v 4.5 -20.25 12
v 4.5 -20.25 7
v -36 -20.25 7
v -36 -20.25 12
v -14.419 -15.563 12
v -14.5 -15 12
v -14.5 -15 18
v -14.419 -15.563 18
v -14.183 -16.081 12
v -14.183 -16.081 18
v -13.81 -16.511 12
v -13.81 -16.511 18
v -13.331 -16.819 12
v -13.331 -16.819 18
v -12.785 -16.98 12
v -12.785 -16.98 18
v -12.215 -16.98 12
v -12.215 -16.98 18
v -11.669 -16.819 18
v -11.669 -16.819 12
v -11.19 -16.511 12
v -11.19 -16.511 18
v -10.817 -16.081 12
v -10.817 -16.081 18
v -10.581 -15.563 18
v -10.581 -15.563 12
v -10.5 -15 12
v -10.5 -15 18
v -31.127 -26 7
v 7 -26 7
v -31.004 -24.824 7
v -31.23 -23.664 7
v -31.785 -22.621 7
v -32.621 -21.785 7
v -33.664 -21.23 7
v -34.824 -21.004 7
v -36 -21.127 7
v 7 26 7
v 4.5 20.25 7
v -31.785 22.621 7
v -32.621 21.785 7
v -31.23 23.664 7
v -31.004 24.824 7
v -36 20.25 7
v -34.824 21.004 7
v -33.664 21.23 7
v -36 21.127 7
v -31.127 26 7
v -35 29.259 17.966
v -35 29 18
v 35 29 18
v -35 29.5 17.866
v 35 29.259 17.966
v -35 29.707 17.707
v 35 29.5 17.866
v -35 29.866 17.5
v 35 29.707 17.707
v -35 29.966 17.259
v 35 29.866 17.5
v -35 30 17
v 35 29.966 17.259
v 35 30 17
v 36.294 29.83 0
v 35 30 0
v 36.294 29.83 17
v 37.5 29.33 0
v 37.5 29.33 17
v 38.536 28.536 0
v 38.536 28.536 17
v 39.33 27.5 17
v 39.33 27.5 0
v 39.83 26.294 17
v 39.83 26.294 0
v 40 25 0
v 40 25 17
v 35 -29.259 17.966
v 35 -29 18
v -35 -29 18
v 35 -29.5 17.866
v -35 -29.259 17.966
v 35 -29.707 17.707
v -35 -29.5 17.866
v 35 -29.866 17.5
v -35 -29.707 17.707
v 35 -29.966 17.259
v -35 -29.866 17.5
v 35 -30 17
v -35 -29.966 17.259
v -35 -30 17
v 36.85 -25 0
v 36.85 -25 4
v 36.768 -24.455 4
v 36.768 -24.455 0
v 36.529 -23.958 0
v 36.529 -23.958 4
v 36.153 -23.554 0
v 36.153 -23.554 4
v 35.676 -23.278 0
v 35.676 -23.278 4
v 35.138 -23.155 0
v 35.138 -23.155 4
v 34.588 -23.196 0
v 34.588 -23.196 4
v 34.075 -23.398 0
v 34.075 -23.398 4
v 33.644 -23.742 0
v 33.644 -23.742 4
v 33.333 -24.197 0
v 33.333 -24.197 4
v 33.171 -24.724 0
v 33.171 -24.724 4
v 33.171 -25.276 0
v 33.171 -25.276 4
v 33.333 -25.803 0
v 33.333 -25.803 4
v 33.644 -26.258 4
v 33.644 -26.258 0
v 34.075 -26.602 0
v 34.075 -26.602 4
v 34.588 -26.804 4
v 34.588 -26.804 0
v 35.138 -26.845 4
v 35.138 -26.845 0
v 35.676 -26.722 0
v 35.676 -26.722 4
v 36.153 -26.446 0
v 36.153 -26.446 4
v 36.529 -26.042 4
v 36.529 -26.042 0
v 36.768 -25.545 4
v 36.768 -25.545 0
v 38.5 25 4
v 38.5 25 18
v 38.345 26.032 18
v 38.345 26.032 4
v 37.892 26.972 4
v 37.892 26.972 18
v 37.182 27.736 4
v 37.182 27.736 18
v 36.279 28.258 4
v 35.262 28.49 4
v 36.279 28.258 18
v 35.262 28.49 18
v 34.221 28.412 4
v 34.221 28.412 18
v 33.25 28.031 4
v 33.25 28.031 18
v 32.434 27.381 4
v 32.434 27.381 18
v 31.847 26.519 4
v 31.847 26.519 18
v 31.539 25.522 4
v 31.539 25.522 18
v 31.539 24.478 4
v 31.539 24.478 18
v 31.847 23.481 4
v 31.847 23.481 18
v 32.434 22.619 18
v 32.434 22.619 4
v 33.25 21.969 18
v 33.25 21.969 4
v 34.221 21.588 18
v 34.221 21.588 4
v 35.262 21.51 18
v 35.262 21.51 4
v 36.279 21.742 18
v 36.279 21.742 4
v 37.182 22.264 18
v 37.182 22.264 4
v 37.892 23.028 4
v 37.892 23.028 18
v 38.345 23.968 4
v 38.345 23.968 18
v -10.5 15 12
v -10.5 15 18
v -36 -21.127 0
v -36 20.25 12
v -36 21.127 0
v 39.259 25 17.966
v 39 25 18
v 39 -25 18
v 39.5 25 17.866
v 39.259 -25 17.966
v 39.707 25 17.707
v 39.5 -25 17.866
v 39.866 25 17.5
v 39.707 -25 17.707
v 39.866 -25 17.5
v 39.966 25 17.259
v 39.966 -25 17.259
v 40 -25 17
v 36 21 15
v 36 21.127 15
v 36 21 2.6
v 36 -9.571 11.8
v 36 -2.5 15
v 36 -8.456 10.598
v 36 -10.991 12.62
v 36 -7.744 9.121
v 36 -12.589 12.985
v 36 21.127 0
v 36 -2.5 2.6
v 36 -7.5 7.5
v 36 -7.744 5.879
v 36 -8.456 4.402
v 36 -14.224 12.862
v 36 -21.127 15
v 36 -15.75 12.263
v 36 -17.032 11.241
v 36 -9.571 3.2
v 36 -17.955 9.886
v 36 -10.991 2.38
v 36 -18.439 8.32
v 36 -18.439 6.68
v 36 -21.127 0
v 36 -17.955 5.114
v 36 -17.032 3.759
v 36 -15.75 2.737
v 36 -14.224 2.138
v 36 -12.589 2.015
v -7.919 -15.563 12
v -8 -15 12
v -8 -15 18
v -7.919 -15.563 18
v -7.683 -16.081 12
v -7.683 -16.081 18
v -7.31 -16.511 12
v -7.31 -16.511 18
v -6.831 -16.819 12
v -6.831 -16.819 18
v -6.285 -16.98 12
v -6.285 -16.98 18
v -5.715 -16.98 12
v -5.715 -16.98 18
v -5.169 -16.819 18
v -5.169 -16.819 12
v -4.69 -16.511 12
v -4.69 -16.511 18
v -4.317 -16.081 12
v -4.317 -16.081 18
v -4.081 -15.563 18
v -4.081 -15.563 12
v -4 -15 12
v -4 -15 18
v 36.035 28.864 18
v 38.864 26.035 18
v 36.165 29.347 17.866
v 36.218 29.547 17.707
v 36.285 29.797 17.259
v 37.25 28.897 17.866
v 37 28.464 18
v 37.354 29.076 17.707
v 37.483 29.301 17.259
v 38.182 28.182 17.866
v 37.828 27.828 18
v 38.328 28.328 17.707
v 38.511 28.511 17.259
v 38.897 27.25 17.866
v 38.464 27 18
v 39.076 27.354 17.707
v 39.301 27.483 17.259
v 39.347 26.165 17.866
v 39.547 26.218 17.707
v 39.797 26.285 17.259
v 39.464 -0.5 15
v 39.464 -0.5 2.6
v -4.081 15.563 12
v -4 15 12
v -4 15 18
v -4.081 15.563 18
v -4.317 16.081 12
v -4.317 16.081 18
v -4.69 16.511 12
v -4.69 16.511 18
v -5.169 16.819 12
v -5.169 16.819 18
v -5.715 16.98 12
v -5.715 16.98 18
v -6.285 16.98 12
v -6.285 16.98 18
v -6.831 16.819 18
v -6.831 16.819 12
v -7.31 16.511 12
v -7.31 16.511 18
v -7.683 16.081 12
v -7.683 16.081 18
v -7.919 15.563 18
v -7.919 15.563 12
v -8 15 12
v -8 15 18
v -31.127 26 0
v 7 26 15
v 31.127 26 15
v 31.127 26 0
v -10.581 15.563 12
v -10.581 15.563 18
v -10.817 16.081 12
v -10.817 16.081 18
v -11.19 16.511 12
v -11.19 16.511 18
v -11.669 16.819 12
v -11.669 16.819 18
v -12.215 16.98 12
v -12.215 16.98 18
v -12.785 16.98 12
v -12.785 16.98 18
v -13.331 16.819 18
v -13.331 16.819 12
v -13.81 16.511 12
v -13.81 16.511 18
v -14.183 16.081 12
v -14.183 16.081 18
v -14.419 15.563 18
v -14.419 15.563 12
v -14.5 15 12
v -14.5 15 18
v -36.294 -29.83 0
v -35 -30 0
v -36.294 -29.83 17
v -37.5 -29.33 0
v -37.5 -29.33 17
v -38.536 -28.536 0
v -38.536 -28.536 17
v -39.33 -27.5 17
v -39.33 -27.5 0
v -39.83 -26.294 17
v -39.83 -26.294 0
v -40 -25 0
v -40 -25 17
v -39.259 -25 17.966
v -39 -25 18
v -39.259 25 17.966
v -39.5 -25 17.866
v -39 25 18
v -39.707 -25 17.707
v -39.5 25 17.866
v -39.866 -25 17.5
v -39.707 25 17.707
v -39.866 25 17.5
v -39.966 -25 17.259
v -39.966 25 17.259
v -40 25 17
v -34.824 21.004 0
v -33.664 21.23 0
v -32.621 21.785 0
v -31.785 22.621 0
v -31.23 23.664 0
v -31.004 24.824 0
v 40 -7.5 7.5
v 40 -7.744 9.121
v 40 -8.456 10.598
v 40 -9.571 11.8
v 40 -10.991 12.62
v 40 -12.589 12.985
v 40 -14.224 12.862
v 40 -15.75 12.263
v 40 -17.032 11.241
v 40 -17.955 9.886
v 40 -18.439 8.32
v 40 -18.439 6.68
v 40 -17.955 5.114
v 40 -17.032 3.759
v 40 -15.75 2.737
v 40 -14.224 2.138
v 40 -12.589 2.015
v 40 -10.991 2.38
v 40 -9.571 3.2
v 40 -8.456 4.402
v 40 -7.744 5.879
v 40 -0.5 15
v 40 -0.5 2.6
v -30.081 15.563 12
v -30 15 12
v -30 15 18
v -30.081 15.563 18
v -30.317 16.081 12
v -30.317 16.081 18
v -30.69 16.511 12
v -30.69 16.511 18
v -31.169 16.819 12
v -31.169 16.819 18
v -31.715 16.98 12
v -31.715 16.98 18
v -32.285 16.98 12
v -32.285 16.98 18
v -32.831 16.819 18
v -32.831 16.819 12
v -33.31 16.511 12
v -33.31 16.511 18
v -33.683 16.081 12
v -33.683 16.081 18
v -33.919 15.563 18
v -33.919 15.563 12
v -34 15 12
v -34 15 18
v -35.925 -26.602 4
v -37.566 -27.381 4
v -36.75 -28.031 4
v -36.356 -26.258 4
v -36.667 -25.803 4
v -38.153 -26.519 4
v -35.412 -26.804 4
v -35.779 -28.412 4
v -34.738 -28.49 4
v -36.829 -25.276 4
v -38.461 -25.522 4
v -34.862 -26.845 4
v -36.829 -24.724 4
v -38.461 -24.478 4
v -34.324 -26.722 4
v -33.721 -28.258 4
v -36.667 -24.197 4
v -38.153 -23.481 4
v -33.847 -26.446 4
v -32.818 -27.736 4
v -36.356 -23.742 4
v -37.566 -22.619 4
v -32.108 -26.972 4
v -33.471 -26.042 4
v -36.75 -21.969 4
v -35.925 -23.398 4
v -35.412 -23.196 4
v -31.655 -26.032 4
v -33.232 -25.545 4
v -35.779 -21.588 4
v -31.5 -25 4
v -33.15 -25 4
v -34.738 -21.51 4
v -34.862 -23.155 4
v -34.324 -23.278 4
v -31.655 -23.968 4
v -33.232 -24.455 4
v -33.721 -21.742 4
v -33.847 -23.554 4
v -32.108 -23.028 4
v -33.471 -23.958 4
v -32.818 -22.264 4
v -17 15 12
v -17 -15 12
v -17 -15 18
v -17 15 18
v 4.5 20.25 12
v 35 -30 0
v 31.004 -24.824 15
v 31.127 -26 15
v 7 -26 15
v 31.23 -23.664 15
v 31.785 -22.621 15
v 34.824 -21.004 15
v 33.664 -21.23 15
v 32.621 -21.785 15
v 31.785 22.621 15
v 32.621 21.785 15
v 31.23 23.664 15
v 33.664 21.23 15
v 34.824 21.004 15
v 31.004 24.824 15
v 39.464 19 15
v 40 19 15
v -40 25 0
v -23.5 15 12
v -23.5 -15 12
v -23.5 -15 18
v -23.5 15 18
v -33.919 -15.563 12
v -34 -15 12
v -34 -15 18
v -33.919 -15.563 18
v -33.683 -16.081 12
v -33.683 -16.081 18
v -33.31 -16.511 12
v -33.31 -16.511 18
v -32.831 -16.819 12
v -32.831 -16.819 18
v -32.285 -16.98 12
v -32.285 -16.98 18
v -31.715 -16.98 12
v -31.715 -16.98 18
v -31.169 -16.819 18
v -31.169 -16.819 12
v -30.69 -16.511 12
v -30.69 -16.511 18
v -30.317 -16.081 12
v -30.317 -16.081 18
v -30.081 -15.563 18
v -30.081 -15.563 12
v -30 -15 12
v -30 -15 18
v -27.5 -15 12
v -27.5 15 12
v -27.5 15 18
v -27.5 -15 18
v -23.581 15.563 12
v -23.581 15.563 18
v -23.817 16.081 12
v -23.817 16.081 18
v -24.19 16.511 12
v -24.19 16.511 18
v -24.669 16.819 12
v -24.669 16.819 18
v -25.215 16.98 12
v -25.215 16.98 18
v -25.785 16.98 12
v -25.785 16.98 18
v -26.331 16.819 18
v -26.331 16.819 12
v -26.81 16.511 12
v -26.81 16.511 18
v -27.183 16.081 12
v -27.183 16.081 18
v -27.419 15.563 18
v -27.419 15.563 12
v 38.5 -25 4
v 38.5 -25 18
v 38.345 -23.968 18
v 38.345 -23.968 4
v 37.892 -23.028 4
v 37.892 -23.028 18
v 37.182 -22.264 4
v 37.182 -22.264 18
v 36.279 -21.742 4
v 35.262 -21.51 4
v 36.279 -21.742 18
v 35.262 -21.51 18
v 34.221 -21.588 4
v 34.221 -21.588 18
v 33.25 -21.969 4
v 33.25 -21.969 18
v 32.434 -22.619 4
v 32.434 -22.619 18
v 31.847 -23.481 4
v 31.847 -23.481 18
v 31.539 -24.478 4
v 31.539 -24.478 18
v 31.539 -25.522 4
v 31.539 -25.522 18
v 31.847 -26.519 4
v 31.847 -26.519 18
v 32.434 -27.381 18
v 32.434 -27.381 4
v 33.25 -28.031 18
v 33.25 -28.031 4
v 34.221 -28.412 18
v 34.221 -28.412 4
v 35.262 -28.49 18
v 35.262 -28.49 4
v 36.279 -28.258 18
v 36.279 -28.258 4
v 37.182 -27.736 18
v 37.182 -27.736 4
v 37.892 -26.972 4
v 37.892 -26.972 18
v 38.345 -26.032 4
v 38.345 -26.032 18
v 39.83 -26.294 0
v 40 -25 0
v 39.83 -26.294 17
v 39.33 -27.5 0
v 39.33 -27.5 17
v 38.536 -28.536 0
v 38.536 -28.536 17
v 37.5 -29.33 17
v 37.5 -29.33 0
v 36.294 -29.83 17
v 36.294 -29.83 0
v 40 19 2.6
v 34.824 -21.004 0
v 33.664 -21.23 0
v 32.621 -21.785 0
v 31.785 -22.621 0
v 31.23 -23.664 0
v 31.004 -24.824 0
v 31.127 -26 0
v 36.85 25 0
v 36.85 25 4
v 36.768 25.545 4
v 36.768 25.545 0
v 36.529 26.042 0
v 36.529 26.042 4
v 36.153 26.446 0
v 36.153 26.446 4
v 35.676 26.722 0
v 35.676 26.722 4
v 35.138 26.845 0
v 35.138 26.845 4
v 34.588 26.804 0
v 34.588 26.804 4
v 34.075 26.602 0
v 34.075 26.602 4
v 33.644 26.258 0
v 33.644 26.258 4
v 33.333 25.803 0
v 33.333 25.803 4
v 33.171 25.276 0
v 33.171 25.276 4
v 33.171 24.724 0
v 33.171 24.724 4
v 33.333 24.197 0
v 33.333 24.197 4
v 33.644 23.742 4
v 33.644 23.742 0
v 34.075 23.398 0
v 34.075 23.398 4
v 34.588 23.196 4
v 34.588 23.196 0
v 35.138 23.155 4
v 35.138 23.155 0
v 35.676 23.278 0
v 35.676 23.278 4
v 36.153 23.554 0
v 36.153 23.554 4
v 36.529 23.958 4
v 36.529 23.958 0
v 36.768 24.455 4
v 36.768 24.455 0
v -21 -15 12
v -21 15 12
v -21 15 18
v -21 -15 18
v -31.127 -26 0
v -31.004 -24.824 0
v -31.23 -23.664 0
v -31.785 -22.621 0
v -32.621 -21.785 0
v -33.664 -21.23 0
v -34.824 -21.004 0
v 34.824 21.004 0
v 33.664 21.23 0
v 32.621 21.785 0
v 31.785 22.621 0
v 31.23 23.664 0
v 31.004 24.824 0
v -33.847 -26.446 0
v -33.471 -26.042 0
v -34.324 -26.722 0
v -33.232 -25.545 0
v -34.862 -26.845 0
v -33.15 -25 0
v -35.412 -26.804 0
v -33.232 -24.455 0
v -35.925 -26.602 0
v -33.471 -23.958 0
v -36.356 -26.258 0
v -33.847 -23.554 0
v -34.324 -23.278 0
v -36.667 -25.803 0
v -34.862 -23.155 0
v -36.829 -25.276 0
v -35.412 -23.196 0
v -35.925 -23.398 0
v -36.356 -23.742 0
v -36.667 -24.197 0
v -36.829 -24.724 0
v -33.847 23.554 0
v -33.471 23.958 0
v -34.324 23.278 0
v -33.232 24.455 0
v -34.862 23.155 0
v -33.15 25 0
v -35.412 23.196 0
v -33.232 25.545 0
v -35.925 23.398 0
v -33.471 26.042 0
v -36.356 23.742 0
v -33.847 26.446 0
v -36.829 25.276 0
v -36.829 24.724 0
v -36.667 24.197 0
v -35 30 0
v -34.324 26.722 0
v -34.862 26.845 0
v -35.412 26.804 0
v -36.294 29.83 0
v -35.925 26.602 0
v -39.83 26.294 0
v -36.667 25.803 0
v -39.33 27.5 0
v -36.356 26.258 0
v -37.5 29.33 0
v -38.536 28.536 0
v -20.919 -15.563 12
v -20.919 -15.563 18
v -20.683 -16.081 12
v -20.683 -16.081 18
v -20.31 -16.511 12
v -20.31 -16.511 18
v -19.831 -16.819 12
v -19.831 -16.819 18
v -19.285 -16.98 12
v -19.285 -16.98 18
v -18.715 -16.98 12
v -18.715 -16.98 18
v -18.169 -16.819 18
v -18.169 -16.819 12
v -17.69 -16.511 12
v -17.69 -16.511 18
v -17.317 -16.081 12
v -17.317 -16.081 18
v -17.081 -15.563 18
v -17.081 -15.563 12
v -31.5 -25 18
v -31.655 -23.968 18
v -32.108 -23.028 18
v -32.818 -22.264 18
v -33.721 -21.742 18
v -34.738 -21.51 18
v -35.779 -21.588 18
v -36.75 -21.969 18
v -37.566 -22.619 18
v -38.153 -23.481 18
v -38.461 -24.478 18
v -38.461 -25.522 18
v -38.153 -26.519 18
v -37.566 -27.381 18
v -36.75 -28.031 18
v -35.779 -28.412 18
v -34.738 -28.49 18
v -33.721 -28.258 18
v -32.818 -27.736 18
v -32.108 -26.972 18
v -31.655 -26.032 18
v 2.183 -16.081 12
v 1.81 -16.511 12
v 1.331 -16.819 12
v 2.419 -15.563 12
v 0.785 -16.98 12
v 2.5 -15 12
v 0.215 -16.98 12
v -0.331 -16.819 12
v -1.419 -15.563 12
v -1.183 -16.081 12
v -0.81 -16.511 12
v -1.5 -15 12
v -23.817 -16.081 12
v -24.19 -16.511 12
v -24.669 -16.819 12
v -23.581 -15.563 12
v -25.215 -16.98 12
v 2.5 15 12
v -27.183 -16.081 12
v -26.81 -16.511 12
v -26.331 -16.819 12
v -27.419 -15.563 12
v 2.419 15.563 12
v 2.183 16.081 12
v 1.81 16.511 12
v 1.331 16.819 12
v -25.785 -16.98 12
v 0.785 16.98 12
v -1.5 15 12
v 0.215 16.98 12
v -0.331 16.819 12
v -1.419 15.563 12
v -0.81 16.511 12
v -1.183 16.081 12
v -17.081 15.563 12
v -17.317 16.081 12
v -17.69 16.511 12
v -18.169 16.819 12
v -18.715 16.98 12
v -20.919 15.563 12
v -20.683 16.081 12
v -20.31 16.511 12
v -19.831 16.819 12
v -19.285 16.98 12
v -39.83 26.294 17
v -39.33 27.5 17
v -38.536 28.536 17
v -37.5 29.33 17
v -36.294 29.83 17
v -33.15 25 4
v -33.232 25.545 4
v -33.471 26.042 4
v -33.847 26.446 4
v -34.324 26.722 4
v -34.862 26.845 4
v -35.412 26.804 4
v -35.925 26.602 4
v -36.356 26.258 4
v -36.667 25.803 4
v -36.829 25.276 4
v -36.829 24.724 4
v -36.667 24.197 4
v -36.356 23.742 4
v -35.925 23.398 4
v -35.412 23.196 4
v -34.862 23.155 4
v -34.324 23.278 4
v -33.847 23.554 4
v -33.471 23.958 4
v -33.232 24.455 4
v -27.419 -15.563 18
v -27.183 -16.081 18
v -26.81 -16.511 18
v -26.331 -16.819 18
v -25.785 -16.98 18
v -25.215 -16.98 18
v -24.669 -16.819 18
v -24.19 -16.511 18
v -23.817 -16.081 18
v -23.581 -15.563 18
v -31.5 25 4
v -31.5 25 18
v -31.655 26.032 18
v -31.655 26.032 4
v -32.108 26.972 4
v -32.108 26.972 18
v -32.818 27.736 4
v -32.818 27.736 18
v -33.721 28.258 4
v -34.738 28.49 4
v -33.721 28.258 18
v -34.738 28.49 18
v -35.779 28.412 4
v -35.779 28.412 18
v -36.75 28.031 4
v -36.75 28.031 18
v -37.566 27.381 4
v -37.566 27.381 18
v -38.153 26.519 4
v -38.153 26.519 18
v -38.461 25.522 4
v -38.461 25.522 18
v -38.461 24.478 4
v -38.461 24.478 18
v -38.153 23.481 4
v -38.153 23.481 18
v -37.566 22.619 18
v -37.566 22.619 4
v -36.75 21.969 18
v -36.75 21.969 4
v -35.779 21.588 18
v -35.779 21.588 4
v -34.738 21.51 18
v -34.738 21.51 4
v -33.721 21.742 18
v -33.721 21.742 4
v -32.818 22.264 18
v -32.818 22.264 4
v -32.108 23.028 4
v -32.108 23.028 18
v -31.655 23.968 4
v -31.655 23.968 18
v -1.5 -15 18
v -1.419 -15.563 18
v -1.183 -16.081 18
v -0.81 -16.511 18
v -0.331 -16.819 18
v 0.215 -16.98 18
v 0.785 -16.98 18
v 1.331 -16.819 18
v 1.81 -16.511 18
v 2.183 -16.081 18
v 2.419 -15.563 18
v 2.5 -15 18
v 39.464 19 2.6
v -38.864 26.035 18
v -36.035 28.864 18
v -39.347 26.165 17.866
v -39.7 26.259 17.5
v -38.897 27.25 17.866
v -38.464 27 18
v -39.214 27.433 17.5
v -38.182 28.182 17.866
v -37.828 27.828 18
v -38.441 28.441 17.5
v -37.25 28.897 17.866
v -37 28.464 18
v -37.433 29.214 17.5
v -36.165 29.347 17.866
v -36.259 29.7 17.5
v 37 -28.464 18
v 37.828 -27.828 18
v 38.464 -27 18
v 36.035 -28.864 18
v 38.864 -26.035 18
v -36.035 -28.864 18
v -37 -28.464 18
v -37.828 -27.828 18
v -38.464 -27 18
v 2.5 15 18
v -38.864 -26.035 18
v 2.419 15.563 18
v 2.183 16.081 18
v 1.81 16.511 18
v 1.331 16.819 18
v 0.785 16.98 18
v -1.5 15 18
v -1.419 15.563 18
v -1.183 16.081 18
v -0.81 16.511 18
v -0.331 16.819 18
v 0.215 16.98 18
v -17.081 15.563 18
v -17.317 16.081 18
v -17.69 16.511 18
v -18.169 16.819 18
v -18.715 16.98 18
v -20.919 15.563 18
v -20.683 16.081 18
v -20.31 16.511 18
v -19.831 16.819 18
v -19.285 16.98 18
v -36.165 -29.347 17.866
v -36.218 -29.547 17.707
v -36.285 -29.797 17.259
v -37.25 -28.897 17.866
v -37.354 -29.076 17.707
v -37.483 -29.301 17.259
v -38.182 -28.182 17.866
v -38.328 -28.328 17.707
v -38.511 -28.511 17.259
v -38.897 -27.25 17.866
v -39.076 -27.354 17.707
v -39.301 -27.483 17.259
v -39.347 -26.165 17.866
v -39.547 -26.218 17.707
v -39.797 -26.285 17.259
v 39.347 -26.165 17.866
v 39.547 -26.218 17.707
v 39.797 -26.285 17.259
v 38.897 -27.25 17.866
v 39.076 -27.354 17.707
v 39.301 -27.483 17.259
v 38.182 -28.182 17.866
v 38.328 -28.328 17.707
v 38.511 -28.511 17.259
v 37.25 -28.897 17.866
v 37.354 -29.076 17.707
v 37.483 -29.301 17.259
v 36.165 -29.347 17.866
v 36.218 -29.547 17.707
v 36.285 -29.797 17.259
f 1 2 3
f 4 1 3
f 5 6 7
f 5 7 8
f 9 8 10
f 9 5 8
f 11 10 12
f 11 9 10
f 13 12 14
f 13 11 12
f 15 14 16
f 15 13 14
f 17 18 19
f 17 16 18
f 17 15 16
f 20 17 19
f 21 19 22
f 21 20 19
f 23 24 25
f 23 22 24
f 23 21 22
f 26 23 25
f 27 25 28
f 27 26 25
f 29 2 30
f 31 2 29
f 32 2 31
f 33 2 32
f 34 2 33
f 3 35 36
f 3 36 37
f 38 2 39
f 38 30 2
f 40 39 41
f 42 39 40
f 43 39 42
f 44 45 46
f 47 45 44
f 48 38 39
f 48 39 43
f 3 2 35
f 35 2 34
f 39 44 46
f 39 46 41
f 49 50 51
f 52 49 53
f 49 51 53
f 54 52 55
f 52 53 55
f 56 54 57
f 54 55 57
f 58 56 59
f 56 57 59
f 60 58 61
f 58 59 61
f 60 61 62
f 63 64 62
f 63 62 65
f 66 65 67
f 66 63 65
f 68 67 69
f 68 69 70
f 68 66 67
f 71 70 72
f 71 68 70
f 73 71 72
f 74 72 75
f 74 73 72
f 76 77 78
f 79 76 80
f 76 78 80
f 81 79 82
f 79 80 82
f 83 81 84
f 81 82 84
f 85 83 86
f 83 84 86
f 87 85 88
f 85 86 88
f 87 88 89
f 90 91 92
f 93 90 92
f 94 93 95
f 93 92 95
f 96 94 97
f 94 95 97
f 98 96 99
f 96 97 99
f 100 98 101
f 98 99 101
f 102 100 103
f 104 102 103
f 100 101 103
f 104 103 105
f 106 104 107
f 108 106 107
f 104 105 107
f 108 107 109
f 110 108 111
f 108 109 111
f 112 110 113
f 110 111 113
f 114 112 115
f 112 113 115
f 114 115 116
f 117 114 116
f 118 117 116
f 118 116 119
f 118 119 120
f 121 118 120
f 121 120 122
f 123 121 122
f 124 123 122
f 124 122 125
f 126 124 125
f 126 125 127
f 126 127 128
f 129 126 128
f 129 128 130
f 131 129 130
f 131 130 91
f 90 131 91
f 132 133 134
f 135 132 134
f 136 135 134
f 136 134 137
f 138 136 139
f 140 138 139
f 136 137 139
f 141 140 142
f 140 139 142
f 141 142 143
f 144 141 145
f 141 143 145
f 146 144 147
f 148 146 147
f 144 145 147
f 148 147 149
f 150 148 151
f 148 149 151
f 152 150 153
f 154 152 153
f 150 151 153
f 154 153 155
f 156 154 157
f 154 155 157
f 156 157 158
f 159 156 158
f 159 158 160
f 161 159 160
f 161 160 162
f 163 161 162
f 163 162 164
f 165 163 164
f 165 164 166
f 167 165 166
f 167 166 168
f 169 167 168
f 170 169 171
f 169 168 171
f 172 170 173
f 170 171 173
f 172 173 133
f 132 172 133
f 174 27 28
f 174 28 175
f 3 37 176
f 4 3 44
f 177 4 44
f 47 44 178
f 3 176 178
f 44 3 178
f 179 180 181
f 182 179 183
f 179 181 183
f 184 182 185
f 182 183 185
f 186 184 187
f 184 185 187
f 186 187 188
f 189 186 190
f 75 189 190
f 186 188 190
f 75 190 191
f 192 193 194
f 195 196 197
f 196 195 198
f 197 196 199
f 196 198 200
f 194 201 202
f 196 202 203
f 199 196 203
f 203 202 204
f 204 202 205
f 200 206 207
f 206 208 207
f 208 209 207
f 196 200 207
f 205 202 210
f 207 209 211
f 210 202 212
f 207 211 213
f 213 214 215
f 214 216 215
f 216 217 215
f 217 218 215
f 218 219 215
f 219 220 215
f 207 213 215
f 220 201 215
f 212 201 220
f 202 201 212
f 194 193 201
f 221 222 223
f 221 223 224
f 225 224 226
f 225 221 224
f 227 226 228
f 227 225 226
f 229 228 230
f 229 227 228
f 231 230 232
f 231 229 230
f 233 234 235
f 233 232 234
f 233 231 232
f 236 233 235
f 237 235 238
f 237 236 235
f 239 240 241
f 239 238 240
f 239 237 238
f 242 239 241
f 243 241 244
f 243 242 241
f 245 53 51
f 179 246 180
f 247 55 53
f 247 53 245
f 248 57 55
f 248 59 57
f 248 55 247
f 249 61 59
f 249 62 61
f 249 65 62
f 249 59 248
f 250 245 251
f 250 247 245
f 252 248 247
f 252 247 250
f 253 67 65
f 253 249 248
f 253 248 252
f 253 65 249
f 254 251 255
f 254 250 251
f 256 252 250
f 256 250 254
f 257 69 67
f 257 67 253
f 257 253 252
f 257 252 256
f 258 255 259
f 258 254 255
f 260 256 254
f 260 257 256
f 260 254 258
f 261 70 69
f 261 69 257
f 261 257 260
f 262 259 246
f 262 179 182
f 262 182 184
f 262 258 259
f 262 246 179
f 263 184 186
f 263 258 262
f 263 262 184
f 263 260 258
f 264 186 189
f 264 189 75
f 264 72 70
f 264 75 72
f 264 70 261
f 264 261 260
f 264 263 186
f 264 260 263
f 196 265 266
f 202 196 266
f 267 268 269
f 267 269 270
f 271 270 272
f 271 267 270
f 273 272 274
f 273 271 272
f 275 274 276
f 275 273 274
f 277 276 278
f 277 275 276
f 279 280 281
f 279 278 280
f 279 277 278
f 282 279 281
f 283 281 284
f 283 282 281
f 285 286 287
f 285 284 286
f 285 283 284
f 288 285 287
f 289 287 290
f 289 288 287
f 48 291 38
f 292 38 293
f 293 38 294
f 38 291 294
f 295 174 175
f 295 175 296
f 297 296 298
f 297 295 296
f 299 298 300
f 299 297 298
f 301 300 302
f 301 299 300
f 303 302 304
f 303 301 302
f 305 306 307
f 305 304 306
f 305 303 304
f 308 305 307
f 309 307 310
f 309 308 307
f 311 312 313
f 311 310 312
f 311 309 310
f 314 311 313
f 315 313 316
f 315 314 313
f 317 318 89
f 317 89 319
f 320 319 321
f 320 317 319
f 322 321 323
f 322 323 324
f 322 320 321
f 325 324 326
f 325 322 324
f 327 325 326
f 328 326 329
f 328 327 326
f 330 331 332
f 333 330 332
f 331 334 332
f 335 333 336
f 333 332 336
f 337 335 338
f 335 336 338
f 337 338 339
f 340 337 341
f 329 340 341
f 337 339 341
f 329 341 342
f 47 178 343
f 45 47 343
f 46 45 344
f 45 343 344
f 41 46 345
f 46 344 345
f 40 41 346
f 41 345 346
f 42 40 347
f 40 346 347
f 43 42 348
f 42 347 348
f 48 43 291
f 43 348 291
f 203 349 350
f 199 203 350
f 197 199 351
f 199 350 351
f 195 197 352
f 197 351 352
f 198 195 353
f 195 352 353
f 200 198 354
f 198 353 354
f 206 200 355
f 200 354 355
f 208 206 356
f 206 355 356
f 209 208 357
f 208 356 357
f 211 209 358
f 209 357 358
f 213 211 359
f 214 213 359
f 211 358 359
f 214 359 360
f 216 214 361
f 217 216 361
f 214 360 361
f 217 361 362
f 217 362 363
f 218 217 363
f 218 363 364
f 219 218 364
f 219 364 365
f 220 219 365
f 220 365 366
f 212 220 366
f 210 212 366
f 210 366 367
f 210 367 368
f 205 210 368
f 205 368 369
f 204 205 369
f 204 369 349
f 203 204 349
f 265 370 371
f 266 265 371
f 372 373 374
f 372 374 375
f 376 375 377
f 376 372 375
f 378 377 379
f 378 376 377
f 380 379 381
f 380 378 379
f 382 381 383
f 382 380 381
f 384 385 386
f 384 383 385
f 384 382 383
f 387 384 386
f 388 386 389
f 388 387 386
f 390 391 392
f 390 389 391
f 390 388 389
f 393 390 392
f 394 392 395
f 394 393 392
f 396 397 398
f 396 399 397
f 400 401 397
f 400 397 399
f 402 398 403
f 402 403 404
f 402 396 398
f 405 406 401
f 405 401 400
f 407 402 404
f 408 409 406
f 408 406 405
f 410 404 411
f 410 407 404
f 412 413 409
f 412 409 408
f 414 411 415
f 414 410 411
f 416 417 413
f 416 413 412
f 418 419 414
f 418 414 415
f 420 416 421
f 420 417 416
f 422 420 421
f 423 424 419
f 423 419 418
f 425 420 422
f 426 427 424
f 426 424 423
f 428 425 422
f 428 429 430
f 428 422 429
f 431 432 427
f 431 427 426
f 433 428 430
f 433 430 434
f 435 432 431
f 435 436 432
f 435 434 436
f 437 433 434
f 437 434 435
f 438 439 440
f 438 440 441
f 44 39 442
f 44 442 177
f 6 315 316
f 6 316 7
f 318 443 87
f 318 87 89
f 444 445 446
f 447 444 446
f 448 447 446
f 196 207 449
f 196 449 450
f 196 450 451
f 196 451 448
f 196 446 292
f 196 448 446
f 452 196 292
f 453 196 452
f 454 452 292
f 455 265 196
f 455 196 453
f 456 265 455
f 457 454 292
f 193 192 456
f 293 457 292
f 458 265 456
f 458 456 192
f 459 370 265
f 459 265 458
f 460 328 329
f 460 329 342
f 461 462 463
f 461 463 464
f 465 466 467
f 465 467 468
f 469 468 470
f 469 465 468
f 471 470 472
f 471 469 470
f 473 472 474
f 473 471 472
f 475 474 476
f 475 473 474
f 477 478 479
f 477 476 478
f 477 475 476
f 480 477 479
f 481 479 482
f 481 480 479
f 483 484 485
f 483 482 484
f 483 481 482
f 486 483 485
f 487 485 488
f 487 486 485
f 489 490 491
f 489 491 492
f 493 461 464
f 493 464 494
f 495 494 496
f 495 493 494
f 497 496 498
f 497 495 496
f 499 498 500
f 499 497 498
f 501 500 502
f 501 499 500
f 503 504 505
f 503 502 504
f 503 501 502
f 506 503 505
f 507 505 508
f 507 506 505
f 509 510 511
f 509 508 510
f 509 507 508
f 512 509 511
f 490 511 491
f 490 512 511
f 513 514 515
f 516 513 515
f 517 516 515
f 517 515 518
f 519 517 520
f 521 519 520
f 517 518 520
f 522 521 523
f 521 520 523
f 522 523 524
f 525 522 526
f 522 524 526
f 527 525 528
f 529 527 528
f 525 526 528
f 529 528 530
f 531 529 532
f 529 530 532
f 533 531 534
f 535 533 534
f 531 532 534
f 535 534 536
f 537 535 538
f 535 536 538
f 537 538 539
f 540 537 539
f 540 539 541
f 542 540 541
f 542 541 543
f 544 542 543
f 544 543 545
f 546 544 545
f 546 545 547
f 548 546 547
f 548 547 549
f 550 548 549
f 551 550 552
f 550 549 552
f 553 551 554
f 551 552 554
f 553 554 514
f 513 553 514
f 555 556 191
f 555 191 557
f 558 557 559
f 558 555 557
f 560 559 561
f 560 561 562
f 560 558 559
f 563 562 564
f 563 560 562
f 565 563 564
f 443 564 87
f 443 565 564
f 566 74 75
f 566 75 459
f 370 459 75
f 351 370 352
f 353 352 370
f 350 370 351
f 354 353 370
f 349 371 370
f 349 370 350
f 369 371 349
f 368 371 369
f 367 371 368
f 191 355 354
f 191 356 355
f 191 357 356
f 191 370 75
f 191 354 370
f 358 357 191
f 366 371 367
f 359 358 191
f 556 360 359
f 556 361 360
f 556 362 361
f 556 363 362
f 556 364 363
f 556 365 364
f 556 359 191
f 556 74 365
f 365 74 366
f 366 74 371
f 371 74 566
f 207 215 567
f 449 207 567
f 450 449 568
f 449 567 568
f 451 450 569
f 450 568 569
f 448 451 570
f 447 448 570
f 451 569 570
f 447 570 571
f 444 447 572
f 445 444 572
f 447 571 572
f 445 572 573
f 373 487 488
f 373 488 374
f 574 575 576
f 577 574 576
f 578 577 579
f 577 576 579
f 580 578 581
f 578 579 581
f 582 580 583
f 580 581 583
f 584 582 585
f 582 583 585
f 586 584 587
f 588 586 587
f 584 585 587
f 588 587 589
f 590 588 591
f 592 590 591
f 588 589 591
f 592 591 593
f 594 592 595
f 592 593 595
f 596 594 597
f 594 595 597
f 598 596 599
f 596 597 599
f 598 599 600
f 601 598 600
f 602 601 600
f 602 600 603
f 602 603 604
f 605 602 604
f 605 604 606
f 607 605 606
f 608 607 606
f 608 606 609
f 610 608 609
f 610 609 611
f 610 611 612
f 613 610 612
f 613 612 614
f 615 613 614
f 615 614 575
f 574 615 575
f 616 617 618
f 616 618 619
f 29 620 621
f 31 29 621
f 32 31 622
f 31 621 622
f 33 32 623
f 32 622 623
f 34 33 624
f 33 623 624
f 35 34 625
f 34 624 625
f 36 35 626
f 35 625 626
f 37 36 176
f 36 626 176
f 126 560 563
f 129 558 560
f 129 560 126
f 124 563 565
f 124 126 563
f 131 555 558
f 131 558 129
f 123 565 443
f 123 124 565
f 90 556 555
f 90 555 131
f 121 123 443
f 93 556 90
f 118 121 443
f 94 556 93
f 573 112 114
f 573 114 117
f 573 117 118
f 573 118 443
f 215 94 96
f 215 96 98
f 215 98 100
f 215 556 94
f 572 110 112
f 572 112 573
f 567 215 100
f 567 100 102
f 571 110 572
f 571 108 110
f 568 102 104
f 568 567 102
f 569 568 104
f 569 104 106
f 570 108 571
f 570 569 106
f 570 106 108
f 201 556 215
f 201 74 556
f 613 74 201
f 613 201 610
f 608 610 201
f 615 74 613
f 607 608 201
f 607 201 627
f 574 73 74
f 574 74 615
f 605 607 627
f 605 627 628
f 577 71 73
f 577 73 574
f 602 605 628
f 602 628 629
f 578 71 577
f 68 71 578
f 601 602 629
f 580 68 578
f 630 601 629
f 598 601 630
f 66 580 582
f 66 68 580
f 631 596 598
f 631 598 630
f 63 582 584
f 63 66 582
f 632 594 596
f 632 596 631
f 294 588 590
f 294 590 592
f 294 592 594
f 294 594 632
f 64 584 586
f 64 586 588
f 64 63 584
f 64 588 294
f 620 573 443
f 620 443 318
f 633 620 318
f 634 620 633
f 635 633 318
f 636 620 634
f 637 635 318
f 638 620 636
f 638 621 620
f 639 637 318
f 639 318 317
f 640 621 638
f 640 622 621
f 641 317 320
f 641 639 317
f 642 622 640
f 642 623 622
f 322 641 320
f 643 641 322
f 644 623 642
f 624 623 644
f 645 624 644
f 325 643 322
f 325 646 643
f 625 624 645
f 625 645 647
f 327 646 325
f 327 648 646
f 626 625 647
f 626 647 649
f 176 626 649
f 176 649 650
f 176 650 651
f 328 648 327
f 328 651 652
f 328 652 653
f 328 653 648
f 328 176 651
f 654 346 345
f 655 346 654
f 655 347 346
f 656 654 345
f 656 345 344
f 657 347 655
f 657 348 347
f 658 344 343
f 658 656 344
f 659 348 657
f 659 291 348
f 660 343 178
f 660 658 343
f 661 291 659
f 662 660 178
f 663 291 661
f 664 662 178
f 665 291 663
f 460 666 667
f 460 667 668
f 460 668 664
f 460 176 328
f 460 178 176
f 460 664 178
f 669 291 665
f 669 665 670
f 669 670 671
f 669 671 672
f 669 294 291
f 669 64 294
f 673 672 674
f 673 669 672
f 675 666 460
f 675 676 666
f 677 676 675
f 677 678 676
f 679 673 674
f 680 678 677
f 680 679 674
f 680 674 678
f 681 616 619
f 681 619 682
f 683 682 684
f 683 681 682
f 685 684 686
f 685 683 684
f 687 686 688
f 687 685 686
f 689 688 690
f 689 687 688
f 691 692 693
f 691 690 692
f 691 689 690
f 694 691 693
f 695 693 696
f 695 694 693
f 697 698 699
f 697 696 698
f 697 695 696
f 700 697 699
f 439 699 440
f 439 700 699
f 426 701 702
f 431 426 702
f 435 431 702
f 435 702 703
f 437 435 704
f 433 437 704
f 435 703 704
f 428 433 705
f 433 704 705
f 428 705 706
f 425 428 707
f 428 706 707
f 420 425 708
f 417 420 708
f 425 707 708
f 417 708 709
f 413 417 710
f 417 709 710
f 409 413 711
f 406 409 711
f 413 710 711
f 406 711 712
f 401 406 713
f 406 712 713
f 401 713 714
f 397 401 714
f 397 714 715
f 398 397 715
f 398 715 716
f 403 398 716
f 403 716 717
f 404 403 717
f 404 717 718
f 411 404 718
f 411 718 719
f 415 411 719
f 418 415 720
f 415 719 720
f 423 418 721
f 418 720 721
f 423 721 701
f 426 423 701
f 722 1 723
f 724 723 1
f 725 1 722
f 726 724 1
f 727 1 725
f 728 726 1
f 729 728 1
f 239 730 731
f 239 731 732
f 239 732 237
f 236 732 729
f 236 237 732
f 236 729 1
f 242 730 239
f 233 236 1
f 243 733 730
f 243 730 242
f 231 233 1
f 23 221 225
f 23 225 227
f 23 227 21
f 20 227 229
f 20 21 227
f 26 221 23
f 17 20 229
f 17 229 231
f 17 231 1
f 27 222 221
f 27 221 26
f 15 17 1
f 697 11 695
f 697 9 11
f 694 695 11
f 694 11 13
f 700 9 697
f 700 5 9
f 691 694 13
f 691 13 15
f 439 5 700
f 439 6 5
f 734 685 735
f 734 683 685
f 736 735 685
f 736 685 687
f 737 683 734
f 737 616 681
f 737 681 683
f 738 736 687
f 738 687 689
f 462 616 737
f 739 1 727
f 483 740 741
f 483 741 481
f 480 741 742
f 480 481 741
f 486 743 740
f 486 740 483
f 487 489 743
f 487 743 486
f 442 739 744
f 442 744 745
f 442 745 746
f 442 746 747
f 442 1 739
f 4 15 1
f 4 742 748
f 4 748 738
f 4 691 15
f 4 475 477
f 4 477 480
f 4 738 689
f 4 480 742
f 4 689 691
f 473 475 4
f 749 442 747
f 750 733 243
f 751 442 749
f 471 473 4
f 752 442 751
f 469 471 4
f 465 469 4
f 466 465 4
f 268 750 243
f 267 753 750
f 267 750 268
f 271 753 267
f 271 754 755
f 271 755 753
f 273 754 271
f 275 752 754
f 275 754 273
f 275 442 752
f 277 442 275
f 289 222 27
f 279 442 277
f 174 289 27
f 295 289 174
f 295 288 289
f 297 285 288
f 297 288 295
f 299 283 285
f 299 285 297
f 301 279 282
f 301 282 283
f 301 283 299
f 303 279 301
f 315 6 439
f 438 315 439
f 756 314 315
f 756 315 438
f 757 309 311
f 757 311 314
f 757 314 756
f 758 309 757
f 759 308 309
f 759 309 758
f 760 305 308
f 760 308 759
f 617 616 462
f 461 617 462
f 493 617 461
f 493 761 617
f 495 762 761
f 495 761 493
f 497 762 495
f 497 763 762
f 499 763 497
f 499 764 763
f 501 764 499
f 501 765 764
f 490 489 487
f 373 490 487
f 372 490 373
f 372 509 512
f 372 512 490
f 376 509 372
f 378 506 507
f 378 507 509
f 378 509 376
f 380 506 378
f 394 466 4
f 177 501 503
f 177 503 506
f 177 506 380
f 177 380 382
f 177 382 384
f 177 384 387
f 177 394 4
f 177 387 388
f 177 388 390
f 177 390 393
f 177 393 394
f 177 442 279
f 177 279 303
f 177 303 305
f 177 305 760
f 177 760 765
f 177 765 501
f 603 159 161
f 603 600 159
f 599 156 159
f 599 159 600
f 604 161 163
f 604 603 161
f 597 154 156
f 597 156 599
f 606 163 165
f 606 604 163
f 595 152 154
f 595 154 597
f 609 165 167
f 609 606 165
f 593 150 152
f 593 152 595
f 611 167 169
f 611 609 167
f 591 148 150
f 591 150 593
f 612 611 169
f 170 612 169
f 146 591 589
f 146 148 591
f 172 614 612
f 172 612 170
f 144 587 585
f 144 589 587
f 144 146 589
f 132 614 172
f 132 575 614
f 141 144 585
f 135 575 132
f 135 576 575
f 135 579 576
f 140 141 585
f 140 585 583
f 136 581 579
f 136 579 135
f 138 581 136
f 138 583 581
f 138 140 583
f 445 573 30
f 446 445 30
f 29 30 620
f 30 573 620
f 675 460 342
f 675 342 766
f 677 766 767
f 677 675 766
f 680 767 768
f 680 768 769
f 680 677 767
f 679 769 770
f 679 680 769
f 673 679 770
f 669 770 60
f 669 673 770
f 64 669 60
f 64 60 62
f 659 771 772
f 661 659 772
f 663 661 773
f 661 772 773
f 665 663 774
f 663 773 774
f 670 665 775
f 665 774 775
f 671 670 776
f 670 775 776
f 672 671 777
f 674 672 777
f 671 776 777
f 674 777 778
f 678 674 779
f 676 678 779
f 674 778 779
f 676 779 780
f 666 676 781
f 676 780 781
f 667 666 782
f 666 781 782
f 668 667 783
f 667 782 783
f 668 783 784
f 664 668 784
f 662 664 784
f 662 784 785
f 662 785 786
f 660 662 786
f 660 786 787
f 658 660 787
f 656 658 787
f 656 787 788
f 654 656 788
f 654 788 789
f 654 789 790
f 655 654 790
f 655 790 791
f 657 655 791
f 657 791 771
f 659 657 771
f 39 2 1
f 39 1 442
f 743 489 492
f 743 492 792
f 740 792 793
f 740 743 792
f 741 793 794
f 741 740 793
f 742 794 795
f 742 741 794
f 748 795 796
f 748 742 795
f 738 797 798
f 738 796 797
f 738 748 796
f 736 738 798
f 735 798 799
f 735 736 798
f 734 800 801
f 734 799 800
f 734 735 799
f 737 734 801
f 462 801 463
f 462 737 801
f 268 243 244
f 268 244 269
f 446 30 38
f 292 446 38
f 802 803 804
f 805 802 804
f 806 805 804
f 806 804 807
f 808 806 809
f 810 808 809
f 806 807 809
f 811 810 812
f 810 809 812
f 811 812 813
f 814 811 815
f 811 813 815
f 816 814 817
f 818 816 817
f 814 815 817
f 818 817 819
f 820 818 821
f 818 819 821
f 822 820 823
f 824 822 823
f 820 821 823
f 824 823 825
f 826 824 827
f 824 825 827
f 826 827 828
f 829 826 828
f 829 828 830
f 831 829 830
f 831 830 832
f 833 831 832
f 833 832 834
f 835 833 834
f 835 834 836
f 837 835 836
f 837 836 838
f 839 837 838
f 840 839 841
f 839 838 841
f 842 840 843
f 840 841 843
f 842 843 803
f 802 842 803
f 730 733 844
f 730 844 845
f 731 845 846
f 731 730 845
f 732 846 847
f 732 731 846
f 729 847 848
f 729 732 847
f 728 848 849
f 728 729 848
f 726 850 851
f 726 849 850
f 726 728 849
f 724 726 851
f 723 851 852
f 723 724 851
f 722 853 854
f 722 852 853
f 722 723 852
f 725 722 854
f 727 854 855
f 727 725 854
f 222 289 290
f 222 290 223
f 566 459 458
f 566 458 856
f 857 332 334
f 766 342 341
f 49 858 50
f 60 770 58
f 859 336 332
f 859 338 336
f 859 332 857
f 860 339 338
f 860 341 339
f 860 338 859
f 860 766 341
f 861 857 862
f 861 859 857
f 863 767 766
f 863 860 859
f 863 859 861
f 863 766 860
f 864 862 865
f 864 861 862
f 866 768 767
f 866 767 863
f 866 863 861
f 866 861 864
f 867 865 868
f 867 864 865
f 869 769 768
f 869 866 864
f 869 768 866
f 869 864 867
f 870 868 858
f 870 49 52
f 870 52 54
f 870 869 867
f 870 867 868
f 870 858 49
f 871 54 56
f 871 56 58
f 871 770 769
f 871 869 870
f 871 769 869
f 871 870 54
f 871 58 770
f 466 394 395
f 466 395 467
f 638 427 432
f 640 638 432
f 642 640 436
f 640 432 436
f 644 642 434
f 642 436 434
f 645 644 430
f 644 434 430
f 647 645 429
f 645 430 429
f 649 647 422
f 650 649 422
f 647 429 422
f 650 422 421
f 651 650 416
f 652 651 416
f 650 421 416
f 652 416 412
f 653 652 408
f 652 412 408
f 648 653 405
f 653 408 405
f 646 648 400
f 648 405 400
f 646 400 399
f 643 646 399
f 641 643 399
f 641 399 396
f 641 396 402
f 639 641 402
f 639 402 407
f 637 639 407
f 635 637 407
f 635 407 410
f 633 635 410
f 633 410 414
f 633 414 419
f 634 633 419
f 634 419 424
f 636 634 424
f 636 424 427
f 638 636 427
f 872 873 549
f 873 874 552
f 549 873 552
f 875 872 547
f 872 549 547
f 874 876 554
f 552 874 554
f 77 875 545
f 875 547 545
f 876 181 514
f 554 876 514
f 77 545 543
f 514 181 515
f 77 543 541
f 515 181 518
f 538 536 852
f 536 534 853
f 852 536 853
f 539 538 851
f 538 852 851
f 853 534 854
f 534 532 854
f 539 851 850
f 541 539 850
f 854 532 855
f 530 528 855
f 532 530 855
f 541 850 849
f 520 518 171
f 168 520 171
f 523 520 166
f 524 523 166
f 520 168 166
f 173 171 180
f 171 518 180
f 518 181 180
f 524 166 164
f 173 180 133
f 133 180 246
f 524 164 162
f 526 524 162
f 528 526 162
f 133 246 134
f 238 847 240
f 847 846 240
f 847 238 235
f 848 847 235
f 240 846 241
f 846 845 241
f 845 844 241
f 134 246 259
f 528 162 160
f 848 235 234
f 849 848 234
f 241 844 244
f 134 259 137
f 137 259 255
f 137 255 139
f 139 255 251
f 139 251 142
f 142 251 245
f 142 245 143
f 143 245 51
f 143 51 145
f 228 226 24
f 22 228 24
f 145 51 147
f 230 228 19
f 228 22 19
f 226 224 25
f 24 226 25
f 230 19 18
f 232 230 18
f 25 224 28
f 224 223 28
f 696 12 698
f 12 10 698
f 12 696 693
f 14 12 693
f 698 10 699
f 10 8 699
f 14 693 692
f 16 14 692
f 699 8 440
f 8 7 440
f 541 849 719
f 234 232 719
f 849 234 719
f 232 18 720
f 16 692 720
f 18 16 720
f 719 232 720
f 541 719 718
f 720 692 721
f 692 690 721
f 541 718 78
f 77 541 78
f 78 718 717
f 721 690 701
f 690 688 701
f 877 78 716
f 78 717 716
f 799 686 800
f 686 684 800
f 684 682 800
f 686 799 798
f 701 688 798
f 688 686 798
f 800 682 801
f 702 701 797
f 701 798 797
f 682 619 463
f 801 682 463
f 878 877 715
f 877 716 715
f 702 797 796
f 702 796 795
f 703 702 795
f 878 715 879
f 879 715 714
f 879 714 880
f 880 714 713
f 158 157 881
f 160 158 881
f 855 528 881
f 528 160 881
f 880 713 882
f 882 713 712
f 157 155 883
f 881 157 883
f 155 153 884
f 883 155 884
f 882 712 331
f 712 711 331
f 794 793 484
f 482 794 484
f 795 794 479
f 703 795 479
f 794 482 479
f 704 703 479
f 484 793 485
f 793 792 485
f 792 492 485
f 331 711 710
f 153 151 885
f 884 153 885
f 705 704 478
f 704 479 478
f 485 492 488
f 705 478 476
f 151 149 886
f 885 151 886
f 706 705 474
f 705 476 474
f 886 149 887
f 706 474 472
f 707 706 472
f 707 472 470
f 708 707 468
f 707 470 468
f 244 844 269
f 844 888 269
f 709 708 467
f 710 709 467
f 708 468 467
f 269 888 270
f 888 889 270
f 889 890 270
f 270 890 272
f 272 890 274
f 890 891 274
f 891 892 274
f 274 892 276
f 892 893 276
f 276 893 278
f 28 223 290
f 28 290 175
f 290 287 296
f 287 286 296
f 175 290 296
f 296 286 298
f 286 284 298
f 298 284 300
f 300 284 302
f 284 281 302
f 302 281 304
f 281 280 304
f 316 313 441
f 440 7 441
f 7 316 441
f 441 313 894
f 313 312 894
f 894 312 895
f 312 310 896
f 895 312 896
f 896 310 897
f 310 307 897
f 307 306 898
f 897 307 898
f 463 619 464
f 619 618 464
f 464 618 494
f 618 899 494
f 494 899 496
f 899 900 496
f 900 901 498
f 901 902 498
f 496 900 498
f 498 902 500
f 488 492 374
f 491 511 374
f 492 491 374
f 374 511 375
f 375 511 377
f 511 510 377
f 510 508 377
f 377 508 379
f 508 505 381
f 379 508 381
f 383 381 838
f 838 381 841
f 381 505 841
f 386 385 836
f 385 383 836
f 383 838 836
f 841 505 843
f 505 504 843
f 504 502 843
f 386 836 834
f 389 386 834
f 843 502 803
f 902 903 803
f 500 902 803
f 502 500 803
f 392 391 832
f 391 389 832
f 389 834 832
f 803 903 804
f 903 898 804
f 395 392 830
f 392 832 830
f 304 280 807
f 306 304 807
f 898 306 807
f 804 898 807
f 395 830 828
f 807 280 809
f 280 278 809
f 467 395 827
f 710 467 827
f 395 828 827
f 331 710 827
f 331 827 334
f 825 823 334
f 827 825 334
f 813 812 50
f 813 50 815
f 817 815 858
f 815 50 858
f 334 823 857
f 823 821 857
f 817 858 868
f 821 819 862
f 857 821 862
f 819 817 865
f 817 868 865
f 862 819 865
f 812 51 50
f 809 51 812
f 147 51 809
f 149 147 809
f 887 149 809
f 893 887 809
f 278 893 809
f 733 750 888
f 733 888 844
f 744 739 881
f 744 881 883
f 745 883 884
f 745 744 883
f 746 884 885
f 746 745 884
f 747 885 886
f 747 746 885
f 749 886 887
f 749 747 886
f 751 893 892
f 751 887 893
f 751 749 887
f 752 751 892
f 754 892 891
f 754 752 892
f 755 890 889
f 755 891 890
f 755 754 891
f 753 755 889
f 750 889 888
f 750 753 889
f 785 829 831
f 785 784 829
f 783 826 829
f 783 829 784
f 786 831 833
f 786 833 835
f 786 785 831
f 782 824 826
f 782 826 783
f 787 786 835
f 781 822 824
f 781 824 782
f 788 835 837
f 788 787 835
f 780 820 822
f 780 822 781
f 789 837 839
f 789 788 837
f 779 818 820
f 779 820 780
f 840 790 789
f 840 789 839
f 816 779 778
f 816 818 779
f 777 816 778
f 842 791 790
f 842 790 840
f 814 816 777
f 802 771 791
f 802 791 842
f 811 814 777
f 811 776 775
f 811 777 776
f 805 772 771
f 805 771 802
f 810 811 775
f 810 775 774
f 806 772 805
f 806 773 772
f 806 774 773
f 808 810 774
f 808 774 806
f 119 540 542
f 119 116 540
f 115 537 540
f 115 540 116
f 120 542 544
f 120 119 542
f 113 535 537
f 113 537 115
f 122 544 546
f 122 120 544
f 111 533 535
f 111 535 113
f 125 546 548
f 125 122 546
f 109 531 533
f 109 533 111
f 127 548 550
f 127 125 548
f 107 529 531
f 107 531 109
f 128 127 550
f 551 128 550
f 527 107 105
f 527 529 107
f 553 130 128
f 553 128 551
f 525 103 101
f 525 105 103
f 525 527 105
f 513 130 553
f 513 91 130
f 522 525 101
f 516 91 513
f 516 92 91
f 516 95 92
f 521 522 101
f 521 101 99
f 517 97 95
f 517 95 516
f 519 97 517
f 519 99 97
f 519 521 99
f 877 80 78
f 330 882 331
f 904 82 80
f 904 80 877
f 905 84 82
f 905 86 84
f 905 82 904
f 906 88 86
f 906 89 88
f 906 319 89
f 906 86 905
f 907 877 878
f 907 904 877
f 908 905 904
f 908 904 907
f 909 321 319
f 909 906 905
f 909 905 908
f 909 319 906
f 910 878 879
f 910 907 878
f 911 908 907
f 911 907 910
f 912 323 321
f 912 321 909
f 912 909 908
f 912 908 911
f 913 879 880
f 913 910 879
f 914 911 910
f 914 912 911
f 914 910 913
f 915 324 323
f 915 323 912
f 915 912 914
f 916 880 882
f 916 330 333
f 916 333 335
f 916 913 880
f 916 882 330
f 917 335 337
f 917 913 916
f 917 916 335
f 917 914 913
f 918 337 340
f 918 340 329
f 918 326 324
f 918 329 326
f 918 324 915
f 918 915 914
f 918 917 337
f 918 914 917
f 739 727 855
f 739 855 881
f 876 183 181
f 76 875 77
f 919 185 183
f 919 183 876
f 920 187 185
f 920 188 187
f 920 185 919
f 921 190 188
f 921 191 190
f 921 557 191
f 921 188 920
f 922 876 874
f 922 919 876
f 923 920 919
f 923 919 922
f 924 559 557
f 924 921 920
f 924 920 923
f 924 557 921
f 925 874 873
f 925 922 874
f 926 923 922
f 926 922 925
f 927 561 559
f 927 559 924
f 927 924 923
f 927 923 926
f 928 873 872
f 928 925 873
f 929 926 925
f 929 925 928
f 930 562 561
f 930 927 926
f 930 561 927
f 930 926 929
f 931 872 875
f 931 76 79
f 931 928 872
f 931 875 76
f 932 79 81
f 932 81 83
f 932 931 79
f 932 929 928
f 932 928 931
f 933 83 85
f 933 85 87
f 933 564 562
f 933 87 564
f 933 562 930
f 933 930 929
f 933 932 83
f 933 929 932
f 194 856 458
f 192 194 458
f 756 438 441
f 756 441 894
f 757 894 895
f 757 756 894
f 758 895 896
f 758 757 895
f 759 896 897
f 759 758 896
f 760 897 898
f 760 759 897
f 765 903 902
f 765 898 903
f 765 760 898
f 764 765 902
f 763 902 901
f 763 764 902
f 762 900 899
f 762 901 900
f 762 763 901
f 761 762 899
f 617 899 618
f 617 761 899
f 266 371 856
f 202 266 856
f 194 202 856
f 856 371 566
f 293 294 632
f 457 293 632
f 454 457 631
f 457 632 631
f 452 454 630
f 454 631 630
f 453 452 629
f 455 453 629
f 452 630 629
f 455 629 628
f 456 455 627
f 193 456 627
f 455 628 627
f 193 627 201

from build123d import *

# Parameters (mm, degrees)
BOSS_EXTRUDE1_DEPTH = 18
CUT_EXTRUDE1_DEPTH  = 7
SKETCH3_R           = 5.5
SKETCH3_W           = 12.4
SKETCH3_H           = 19.5
CUT_EXTRUDE2_DEPTH  = 22
CUT_EXTRUDE3_DEPTH  = 8
FILLET1_R           = 1
SKETCH7_W           = 40.5
SKETCH7_H           = 40.5
CUT_EXTRUDE5_DEPTH  = 5
CUT_EXTRUDE7_DEPTH  = 52.419840529
SKETCH10_R          = 3.5
CUT_EXTRUDE8_DEPTH  = 14
SKETCH11_R          = 1.85
CUT_EXTRUDE9_DEPTH  = 52.923019943
CHAMFER1_SIZE       = 2
CHAMFER1_SIZE2      = 3.464101615


with BuildPart() as part:
    # Sketch1 → Boss-Extrude1 (new body)
    with BuildSketch(Plane.XY):
        with BuildLine():
            Line((-35, 30), (35, 30))
            ThreePointArc((35, 30), (38.535533906, 28.535533906), (40, 25))
            Line((40, 25), (40, -25))
            ThreePointArc((40, -25), (38.535533906, -28.535533906), (35, -30))
            Line((35, -30), (-35, -30))
            ThreePointArc((-35, -30), (-38.535533906, -28.535533906), (-40, -25))
            Line((-40, -25), (-40, 25))
            ThreePointArc((-40, 25), (-38.535533906, 28.535533906), (-35, 30))
        make_face()
    extrude(amount=BOSS_EXTRUDE1_DEPTH)

    # Sketch2 → Cut-Extrude1 (cut)
    with BuildSketch(Plane(origin=(0, 0, 0), x_dir=(-1, 0, 0), z_dir=(0, 0, -1))):
        with BuildLine():
            Line((-36, 21.127016654), (-36, -21.127016654))
            ThreePointArc((-36, -21.127016654), (-32.171572875, -22.171572875), (-31.127016654, -26))
            Line((-31.127016654, -26), (31.127016654, -26))
            ThreePointArc((31.127016654, -26), (32.171572875, -22.171572875), (36, -21.127016654))
            Line((36, -21.127016654), (36, 21.127016654))
            ThreePointArc((36, 21.127016654), (32.171572875, 22.171572875), (31.127016654, 26))
            Line((31.127016654, 26), (-31.127016654, 26))
            ThreePointArc((-31.127016654, 26), (-32.171572875, 22.171572875), (-36, 21.127016654))
        make_face()
    extrude(amount=-CUT_EXTRUDE1_DEPTH, mode=Mode.SUBTRACT)

    # Sketch3 → Cut-Extrude2 (cut)
    with BuildSketch(Plane(origin=(40, 0, 0), x_dir=(0, 0, -1), z_dir=(1, 0, 0))):
        with Locations(Location((-7.5, -13, 0), (0, 0, 90))):
            Circle(SKETCH3_R)
        with Locations((-8.8, 9.25)):
            Rectangle(SKETCH3_W, SKETCH3_H)
    extrude(amount=-CUT_EXTRUDE2_DEPTH, mode=Mode.SUBTRACT)

    # Sketch4 → Cut-Extrude3 (cut)
    with BuildSketch(Plane(origin=(0, 0, 7), x_dir=(-1, 0, 0), z_dir=(0, 0, -1))):
        with BuildLine():
            Line((-31.127016654, -26), (-7, -26))
            Line((-7, -26), (-7, 26))
            Line((-7, 26), (-31.127016654, 26))
            ThreePointArc((-31.127016654, 26), (-32.171572875, 22.171572875), (-36, 21.127016654))
            Line((-36, 21.127016654), (-36, -21.127016654))
            ThreePointArc((-36, -21.127016654), (-32.171572875, -22.171572875), (-31.127016654, -26))
        make_face()
    extrude(amount=-CUT_EXTRUDE3_DEPTH, mode=Mode.SUBTRACT)

    # Fillet1
    fillet1_edges = [part.edges().sort_by_distance(p)[0] for p in [
        (-38.535533906, 28.535533906, 18),
        (-40, 0, 18),
        (-38.535533906, -28.535533906, 18),
        (0, -30, 18),
        (38.535533906, -28.535533906, 18),
        (40, 0, 18),
        (38.535533906, 28.535533906, 18),
        (0, 30, 18),
    ]]
    fillet(fillet1_edges, radius=FILLET1_R)

    # Sketch7 → Cut-Extrude5 (cut)
    with BuildSketch(Plane(origin=(0, 0, 7), x_dir=(-1, 0, 0), z_dir=(0, 0, -1))):
        with Locations((15.75, 0)):
            Rectangle(SKETCH7_W, SKETCH7_H)
    extrude(amount=-CUT_EXTRUDE5_DEPTH, mode=Mode.SUBTRACT)

    # Sketch9 → Cut-Extrude7 (cut, through all)
    with BuildSketch(Plane(origin=(0, 0, 12), x_dir=(-1, 0, 0), z_dir=(0, 0, -1))):
        with BuildLine():
            Line((1.5, 15), (1.5, -15))
            ThreePointArc((1.5, -15), (-0.5, -17), (-2.5, -15))
            Line((-2.5, -15), (-2.5, 15))
            ThreePointArc((-2.5, 15), (-0.5, 17), (1.5, 15))
        make_face()
        with BuildLine():
            Line((8, 15), (8, -15))
            ThreePointArc((8, -15), (6, -17), (4, -15))
            Line((4, -15), (4, 15))
            ThreePointArc((4, 15), (6, 17), (8, 15))
        make_face()
        with BuildLine():
            Line((14.5, 15), (14.5, -15))
            ThreePointArc((14.5, -15), (12.5, -17), (10.5, -15))
            Line((10.5, -15), (10.5, 15))
            ThreePointArc((10.5, 15), (12.5, 17), (14.5, 15))
        make_face()
        with BuildLine():
            Line((21, 15), (21, -15))
            ThreePointArc((21, -15), (19, -17), (17, -15))
            Line((17, -15), (17, 15))
            ThreePointArc((17, 15), (19, 17), (21, 15))
        make_face()
        with BuildLine():
            Line((27.5, 15), (27.5, -15))
            ThreePointArc((27.5, -15), (25.5, -17), (23.5, -15))
            Line((23.5, -15), (23.5, 15))
            ThreePointArc((23.5, 15), (25.5, 17), (27.5, 15))
        make_face()
        with BuildLine():
            Line((34, 15), (34, -15))
            ThreePointArc((34, -15), (32, -17), (30, -15))
            Line((30, -15), (30, 15))
            ThreePointArc((30, 15), (32, 17), (34, 15))
        make_face()
    extrude(amount=-CUT_EXTRUDE7_DEPTH, mode=Mode.SUBTRACT)

    # Sketch10 → Cut-Extrude8 (cut)
    with BuildSketch(Plane.XY.offset(18)):
        with Locations((-35, 25)):
            Circle(SKETCH10_R)
        with Locations((-35, -25)):
            Circle(SKETCH10_R)
        with Locations((35, -25)):
            Circle(SKETCH10_R)
        with Locations((35, 25)):
            Circle(SKETCH10_R)
    extrude(amount=-CUT_EXTRUDE8_DEPTH, mode=Mode.SUBTRACT)

    # Sketch11 → Cut-Extrude9 (cut, through all)
    with BuildSketch(Plane.XY.offset(4)):
        with Locations((35, -25)):
            Circle(SKETCH11_R)
        with Locations((35, 25)):
            Circle(SKETCH11_R)
        with Locations((-35, 25)):
            Circle(SKETCH11_R)
        with Locations((-35, -25)):
            Circle(SKETCH11_R)
    extrude(amount=-CUT_EXTRUDE9_DEPTH, mode=Mode.SUBTRACT)

    # Chamfer1
    chamfer1_edges = [part.edges().sort_by_distance(p)[0] for p in [
        (36, -0.5, 8.8),
        (36, 19, 8.8),
    ]]
    chamfer1_side = [part.faces().sort_by_distance(p)[0] for p in [
        (36, -3.371364126, 6.44153534),
    ]]
    chamfer(chamfer1_edges, length=CHAMFER1_SIZE, length2=CHAMFER1_SIZE2, reference=chamfer1_side[0])


solid = part.part
